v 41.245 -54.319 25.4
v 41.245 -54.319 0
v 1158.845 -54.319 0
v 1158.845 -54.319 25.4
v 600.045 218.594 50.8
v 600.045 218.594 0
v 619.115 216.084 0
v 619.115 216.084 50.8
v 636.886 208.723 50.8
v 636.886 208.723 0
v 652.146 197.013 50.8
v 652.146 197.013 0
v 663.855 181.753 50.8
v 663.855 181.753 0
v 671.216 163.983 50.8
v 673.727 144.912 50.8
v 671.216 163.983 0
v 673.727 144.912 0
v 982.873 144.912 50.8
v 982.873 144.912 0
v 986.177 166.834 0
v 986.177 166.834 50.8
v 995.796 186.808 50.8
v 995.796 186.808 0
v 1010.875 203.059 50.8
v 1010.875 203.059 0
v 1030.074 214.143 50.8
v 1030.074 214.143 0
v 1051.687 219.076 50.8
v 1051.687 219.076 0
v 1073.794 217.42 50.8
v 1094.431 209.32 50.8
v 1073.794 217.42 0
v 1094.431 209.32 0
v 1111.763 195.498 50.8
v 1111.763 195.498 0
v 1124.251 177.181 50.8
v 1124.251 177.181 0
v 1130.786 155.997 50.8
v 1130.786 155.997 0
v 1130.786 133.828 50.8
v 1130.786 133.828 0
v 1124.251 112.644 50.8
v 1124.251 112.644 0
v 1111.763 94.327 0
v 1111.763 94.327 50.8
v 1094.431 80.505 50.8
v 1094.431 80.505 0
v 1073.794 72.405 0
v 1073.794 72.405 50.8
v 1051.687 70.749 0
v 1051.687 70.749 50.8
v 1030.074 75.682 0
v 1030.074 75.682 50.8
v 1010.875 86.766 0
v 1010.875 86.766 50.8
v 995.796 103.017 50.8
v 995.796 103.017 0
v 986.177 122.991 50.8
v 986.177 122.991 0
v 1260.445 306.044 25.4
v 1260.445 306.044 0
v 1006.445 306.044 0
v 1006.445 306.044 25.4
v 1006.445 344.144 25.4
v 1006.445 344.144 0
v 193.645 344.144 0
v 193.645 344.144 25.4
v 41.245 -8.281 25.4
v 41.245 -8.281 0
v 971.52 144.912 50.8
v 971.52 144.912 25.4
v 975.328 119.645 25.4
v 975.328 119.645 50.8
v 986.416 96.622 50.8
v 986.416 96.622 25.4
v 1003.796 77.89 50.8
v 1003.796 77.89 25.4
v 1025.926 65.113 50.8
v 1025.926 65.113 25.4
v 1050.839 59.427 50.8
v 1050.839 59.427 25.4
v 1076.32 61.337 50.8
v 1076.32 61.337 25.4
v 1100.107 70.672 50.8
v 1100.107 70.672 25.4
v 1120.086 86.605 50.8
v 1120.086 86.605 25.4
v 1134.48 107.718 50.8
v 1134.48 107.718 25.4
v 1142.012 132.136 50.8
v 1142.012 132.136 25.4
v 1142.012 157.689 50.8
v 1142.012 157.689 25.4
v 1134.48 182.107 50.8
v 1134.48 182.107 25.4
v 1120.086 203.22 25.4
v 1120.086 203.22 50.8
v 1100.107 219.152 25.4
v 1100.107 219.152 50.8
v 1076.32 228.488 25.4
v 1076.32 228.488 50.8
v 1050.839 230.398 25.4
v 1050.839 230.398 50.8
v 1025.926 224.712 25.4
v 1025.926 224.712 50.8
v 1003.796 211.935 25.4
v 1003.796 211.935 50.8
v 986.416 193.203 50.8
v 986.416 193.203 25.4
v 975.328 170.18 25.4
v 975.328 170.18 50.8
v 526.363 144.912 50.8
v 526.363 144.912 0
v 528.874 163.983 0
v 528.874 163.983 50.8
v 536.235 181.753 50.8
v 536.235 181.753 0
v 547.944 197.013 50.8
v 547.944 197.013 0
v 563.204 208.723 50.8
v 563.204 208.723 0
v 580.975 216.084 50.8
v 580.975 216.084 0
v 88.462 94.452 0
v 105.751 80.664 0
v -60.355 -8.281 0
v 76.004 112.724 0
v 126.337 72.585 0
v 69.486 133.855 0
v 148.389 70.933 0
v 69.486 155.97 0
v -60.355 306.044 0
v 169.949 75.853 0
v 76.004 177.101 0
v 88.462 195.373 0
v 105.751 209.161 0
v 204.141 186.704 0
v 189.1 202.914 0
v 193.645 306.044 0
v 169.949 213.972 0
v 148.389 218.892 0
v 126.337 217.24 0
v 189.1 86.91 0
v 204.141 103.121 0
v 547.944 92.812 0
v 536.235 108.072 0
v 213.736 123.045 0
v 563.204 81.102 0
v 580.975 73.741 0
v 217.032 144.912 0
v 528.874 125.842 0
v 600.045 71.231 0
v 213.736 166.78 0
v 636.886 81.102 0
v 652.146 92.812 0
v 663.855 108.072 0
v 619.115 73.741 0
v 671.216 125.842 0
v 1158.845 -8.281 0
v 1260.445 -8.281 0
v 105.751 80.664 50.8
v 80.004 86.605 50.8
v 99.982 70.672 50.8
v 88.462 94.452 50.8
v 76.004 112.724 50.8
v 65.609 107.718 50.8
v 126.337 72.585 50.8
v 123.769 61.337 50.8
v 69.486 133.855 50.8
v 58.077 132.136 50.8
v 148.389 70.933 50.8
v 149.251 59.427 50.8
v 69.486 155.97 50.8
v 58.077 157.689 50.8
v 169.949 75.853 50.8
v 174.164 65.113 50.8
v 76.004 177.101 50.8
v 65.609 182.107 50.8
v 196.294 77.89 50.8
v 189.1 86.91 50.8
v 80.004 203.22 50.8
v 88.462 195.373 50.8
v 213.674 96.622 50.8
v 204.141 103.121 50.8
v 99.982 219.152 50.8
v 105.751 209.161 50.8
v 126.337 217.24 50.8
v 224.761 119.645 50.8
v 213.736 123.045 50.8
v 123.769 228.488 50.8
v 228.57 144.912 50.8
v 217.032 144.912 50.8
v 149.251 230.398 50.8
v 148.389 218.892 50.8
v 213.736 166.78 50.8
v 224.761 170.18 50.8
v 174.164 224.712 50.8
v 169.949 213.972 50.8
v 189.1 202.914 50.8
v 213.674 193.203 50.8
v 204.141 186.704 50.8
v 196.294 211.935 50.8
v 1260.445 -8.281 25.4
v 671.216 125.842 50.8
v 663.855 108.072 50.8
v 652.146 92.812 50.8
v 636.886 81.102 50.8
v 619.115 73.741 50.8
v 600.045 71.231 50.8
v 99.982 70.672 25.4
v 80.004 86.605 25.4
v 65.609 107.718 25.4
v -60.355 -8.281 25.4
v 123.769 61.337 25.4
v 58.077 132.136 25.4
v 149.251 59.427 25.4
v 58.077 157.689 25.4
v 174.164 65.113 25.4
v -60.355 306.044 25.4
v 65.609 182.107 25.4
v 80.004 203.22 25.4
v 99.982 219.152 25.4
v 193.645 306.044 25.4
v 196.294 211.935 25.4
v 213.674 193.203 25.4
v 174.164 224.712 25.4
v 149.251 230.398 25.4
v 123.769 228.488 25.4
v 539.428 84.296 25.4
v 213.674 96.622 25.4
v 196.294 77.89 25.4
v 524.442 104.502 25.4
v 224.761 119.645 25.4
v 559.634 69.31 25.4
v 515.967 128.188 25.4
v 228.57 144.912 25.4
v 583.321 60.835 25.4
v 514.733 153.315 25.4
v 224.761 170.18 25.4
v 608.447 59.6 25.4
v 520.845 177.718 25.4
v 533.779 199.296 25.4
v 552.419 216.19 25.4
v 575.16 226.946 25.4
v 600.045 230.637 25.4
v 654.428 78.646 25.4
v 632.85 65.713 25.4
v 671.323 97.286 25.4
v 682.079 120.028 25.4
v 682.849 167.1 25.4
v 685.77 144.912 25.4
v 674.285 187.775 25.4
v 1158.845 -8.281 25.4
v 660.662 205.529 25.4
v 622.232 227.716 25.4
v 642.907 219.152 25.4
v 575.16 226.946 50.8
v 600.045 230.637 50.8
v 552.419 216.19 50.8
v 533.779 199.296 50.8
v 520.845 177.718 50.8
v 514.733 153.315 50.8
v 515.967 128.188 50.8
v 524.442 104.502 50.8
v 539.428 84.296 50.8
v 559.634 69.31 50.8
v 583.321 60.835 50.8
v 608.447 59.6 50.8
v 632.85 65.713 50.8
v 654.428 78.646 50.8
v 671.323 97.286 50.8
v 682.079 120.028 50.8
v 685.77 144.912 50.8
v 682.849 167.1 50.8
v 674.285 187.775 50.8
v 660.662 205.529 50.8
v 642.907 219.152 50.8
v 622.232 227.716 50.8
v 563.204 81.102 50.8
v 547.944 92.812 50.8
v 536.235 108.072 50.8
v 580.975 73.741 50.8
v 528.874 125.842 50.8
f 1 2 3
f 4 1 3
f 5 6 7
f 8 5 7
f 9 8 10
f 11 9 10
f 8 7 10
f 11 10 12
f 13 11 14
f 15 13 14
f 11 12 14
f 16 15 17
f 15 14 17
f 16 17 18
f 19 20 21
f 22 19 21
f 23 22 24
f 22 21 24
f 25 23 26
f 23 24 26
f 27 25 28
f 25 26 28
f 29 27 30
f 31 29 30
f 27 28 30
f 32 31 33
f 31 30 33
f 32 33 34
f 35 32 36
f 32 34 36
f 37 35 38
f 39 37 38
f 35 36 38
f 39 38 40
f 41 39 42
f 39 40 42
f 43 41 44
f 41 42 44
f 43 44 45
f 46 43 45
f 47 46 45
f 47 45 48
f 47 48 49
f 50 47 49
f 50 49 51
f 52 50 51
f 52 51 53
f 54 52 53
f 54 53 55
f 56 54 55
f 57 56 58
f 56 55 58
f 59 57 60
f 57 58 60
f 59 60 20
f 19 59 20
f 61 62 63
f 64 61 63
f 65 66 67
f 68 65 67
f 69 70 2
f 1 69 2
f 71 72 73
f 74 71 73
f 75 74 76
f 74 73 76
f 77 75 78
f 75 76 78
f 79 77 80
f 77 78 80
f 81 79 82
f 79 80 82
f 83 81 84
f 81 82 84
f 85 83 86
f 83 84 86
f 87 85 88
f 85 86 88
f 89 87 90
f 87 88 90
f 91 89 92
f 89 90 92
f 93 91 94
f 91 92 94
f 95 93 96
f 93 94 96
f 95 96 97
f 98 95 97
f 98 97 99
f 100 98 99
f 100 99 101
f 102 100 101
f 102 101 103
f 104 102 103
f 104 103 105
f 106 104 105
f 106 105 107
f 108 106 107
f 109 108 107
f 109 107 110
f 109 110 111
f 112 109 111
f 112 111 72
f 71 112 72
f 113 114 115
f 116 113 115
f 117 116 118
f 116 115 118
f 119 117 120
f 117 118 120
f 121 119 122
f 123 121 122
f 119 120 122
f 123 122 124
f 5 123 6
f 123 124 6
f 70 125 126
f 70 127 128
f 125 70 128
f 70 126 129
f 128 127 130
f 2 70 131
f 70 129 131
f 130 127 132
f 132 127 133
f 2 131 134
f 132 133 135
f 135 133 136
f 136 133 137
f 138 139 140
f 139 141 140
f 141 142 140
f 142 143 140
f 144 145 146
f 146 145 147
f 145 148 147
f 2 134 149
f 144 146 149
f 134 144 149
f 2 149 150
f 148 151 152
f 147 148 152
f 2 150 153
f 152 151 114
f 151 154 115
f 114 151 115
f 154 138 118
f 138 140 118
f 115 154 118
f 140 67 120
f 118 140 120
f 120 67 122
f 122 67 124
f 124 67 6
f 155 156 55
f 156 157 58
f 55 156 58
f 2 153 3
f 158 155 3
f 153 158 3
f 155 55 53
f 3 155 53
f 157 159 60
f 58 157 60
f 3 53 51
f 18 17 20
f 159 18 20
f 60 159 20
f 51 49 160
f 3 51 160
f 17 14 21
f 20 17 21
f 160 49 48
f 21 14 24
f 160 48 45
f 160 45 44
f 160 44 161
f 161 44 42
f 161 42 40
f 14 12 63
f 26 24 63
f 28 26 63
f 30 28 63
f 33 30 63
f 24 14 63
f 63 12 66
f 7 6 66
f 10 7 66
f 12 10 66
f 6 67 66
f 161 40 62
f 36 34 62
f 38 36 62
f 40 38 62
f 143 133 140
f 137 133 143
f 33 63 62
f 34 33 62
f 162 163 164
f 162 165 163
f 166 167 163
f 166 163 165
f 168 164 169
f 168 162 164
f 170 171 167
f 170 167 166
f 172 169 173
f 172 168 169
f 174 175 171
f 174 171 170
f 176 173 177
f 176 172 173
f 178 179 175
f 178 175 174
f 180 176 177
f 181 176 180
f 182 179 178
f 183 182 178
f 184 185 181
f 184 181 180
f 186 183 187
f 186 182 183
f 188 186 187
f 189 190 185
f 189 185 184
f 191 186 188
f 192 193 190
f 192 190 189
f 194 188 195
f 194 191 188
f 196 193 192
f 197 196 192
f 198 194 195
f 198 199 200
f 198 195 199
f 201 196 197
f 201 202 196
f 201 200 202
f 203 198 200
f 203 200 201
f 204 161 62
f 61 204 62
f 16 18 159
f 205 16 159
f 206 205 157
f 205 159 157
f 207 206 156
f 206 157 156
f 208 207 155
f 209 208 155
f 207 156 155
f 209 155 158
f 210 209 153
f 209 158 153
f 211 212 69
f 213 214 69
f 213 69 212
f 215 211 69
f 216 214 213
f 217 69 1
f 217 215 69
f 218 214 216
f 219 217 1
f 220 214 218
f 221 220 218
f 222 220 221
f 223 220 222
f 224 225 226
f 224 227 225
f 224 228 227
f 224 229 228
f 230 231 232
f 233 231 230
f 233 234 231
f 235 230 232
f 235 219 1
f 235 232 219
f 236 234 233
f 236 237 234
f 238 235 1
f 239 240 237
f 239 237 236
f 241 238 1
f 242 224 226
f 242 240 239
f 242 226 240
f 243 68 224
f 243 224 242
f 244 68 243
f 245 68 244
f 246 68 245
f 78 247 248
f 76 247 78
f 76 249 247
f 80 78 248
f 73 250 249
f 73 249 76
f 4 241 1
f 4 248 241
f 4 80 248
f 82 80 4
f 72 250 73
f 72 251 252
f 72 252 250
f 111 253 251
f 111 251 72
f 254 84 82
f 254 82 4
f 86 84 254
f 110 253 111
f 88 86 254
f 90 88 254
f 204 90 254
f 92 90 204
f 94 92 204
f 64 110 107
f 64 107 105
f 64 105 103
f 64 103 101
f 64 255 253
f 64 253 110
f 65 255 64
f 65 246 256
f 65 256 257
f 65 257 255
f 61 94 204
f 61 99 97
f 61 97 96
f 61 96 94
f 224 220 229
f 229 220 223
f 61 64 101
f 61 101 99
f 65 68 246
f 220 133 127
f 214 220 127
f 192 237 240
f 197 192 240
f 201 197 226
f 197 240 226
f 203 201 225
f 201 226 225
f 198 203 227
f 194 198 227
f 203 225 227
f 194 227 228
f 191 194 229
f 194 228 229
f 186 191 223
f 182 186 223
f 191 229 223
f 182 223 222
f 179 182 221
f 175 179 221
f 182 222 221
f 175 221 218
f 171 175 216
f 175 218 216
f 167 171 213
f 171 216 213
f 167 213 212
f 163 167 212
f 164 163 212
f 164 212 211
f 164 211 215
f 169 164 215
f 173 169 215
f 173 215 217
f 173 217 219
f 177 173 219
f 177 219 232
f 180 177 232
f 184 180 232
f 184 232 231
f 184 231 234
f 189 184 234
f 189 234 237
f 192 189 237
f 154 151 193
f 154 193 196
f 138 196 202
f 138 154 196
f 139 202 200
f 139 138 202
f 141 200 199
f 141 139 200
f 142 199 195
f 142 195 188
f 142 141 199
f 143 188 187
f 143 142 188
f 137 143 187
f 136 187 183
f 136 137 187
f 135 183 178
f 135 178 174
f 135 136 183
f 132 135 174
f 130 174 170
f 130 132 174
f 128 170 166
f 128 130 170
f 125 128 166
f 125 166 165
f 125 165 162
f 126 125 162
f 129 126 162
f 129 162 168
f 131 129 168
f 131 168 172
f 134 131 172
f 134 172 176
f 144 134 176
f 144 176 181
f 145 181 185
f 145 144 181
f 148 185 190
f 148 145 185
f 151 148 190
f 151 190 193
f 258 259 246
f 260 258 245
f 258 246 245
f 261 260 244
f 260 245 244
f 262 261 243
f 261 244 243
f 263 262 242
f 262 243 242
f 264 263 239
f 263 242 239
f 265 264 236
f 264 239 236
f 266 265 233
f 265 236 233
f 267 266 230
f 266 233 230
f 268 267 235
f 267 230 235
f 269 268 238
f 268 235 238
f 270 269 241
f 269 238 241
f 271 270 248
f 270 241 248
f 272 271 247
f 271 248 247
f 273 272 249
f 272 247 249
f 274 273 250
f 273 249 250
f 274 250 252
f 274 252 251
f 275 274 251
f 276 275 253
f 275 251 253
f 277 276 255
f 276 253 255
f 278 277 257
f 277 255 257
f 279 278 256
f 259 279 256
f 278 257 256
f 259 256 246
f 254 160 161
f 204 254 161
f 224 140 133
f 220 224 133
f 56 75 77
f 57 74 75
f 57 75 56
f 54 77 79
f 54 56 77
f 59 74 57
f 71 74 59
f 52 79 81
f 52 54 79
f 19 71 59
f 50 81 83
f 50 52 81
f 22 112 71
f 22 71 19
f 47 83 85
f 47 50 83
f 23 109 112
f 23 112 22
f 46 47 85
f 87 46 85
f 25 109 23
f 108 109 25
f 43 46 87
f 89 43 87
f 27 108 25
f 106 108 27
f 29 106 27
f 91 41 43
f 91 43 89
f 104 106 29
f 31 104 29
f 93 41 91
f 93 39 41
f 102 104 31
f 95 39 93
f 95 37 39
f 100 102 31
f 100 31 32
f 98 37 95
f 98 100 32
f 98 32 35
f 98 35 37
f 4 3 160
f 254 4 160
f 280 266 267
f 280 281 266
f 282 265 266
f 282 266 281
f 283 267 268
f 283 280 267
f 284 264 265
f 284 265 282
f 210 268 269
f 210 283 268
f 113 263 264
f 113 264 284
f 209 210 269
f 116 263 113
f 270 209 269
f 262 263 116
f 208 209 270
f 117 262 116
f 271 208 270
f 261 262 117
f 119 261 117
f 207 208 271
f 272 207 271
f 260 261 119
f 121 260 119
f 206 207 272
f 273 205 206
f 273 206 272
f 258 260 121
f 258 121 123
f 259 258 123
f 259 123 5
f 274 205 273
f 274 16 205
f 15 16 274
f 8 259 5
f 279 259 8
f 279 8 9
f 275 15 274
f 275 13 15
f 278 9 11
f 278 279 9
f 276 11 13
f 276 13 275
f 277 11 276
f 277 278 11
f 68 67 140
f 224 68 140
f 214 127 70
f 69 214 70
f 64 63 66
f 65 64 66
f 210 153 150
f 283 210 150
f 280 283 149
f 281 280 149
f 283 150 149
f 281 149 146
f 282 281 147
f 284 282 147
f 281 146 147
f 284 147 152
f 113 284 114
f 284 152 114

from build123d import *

# Parameters (mm, degrees)
F0_R     = 85.725
F1_DEPTH = 25.4
F0_R_2   = 74.1873427713
F2_DEPTH = 50.8
F3_DEPTH = 50.8
F4_DEPTH = 50.8


with BuildPart() as f1:
    # F0 (on Top) → F1 (new body)
    with BuildSketch(Plane.XY):
        with BuildLine():
            Line((193.6448768675, 306.0437094688), (-60.3551231325, 306.0437094688))
            Line((-60.3551231325, 306.0437094688), (-60.3551231325, -8.2812905312))
            Line((-60.3551231325, -8.2812905312), (41.2448768675, -8.2812905312))
            Line((41.2448768675, -8.2812905312), (41.2448768675, -54.3187905312))
            Line((41.2448768675, -54.3187905312), (600.0448768675, -54.3187905312))
            Line((600.0448768675, -54.3187905312), (600.0448768675, 59.1874594688))
            ThreePointArc((600.0448768675, 59.1874594688), (539.4281480503, 84.2957306516), (514.3198768675, 144.9124594688))
            ThreePointArc((514.3198768675, 144.9124594688), (539.4281480503, 205.5291882861), (600.0448768675, 230.6374594688))
            Line((600.0448768675, 230.6374594688), (600.0448768675, 344.1437094688))
            Line((600.0448768675, 344.1437094688), (193.6448768675, 344.1437094688))
            Line((193.6448768675, 344.1437094688), (193.6448768675, 306.0437094688))
        make_face()
        with Locations((142.8448768675, 144.9124594688)):
            Circle(F0_R, mode=Mode.SUBTRACT)
        with BuildLine():
            Line((1006.4448768675, 344.1437094688), (600.0448768675, 344.1437094688))
            Line((600.0448768675, 344.1437094688), (600.0448768675, 230.6374594688))
            ThreePointArc((600.0448768675, 230.6374594688), (660.6616056848, 205.5291882861), (685.7698768675, 144.9124594688))
            ThreePointArc((685.7698768675, 144.9124594688), (660.6616056848, 84.2957306516), (600.0448768675, 59.1874594688))
            Line((600.0448768675, 59.1874594688), (600.0448768675, -54.3187905312))
            Line((600.0448768675, -54.3187905312), (1158.8448768675, -54.3187905312))
            Line((1158.8448768675, -54.3187905312), (1158.8448768675, -8.2812905312))
            Line((1158.8448768675, -8.2812905312), (1260.4448768675, -8.2812905312))
            Line((1260.4448768675, -8.2812905312), (1260.4448768675, 306.0437094688))
            Line((1260.4448768675, 306.0437094688), (1006.4448768675, 306.0437094688))
            Line((1006.4448768675, 306.0437094688), (1006.4448768675, 344.1437094688))
        make_face()
        with BuildLine():
            ThreePointArc((1142.9698768675, 144.9124594688), (1057.2448768675, 59.1874594688), (971.5198768675, 144.9124594688))
            ThreePointArc((971.5198768675, 144.9124594688), (1057.2448768675, 230.6374594688), (1142.9698768675, 144.9124594688))
        make_face(mode=Mode.SUBTRACT)
    extrude(amount=F1_DEPTH)

    # F0 (on Top) → F2 (join)
    with BuildSketch(Plane.XY):
        with Locations((142.8448768675, 144.9124594688)):
            Circle(F0_R)
        with Locations((142.8448768675, 144.9124594688)):
            Circle(F0_R_2, mode=Mode.SUBTRACT)
    extrude(amount=F2_DEPTH)

    # F0 (on Top) → F3 (join)
    with BuildSketch(Plane.XY):
        with BuildLine():
            Line((600.0448768675, 71.2306225134), (600.0448768675, 59.1874594688))
            ThreePointArc((600.0448768675, 59.1874594688), (660.6616056848, 84.2957306516), (685.7698768675, 144.9124594688))
            Line((685.7698768675, 144.9124594688), (673.726713823, 144.9124594688))
            ThreePointArc((673.726713823, 144.9124594688), (652.145803429, 92.8115329074), (600.0448768675, 71.2306225134))
        make_face()
        with BuildLine():
            ThreePointArc((685.7698768675, 144.9124594688), (660.6616056848, 205.5291882861), (600.0448768675, 230.6374594688))
            Line((600.0448768675, 230.6374594688), (600.0448768675, 218.5942964243))
            ThreePointArc((600.0448768675, 218.5942964243), (652.145803429, 197.0133860303), (673.726713823, 144.9124594688))
            Line((673.726713823, 144.9124594688), (685.7698768675, 144.9124594688))
        make_face()
        with BuildLine():
            Line((600.0448768675, 218.5942964243), (600.0448768675, 230.6374594688))
            ThreePointArc((600.0448768675, 230.6374594688), (539.4281480503, 205.5291882861), (514.3198768675, 144.9124594688))
            Line((514.3198768675, 144.9124594688), (526.3630399121, 144.9124594688))
            ThreePointArc((526.3630399121, 144.9124594688), (547.9439503061, 197.0133860303), (600.0448768675, 218.5942964243))
        make_face()
        with BuildLine():
            ThreePointArc((514.3198768675, 144.9124594688), (539.4281480503, 84.2957306516), (600.0448768675, 59.1874594688))
            Line((600.0448768675, 59.1874594688), (600.0448768675, 71.2306225134))
            ThreePointArc((600.0448768675, 71.2306225134), (547.9439503061, 92.8115329074), (526.3630399121, 144.9124594688))
            Line((526.3630399121, 144.9124594688), (514.3198768675, 144.9124594688))
        make_face()
    extrude(amount=F3_DEPTH)

    # F0 (on Top) → F4 (join)
    with BuildSketch(Plane.XY):
        with BuildLine():
            ThreePointArc((1142.9698768675, 144.9124594688), (1057.2448768675, 230.6374594688), (971.5198768675, 144.9124594688))
            ThreePointArc((971.5198768675, 144.9124594688), (1057.2448768675, 59.1874594688), (1142.9698768675, 144.9124594688))
        make_face()
        with BuildLine():
            ThreePointArc((1131.6165984788, 144.9124594688), (1057.2448768675, 70.5407378575), (982.8731552562, 144.9124594688))
            ThreePointArc((982.8731552562, 144.9124594688), (1057.2448768675, 219.2841810801), (1131.6165984788, 144.9124594688))
        make_face(mode=Mode.SUBTRACT)
    extrude(amount=F4_DEPTH)


solid = f1.part
